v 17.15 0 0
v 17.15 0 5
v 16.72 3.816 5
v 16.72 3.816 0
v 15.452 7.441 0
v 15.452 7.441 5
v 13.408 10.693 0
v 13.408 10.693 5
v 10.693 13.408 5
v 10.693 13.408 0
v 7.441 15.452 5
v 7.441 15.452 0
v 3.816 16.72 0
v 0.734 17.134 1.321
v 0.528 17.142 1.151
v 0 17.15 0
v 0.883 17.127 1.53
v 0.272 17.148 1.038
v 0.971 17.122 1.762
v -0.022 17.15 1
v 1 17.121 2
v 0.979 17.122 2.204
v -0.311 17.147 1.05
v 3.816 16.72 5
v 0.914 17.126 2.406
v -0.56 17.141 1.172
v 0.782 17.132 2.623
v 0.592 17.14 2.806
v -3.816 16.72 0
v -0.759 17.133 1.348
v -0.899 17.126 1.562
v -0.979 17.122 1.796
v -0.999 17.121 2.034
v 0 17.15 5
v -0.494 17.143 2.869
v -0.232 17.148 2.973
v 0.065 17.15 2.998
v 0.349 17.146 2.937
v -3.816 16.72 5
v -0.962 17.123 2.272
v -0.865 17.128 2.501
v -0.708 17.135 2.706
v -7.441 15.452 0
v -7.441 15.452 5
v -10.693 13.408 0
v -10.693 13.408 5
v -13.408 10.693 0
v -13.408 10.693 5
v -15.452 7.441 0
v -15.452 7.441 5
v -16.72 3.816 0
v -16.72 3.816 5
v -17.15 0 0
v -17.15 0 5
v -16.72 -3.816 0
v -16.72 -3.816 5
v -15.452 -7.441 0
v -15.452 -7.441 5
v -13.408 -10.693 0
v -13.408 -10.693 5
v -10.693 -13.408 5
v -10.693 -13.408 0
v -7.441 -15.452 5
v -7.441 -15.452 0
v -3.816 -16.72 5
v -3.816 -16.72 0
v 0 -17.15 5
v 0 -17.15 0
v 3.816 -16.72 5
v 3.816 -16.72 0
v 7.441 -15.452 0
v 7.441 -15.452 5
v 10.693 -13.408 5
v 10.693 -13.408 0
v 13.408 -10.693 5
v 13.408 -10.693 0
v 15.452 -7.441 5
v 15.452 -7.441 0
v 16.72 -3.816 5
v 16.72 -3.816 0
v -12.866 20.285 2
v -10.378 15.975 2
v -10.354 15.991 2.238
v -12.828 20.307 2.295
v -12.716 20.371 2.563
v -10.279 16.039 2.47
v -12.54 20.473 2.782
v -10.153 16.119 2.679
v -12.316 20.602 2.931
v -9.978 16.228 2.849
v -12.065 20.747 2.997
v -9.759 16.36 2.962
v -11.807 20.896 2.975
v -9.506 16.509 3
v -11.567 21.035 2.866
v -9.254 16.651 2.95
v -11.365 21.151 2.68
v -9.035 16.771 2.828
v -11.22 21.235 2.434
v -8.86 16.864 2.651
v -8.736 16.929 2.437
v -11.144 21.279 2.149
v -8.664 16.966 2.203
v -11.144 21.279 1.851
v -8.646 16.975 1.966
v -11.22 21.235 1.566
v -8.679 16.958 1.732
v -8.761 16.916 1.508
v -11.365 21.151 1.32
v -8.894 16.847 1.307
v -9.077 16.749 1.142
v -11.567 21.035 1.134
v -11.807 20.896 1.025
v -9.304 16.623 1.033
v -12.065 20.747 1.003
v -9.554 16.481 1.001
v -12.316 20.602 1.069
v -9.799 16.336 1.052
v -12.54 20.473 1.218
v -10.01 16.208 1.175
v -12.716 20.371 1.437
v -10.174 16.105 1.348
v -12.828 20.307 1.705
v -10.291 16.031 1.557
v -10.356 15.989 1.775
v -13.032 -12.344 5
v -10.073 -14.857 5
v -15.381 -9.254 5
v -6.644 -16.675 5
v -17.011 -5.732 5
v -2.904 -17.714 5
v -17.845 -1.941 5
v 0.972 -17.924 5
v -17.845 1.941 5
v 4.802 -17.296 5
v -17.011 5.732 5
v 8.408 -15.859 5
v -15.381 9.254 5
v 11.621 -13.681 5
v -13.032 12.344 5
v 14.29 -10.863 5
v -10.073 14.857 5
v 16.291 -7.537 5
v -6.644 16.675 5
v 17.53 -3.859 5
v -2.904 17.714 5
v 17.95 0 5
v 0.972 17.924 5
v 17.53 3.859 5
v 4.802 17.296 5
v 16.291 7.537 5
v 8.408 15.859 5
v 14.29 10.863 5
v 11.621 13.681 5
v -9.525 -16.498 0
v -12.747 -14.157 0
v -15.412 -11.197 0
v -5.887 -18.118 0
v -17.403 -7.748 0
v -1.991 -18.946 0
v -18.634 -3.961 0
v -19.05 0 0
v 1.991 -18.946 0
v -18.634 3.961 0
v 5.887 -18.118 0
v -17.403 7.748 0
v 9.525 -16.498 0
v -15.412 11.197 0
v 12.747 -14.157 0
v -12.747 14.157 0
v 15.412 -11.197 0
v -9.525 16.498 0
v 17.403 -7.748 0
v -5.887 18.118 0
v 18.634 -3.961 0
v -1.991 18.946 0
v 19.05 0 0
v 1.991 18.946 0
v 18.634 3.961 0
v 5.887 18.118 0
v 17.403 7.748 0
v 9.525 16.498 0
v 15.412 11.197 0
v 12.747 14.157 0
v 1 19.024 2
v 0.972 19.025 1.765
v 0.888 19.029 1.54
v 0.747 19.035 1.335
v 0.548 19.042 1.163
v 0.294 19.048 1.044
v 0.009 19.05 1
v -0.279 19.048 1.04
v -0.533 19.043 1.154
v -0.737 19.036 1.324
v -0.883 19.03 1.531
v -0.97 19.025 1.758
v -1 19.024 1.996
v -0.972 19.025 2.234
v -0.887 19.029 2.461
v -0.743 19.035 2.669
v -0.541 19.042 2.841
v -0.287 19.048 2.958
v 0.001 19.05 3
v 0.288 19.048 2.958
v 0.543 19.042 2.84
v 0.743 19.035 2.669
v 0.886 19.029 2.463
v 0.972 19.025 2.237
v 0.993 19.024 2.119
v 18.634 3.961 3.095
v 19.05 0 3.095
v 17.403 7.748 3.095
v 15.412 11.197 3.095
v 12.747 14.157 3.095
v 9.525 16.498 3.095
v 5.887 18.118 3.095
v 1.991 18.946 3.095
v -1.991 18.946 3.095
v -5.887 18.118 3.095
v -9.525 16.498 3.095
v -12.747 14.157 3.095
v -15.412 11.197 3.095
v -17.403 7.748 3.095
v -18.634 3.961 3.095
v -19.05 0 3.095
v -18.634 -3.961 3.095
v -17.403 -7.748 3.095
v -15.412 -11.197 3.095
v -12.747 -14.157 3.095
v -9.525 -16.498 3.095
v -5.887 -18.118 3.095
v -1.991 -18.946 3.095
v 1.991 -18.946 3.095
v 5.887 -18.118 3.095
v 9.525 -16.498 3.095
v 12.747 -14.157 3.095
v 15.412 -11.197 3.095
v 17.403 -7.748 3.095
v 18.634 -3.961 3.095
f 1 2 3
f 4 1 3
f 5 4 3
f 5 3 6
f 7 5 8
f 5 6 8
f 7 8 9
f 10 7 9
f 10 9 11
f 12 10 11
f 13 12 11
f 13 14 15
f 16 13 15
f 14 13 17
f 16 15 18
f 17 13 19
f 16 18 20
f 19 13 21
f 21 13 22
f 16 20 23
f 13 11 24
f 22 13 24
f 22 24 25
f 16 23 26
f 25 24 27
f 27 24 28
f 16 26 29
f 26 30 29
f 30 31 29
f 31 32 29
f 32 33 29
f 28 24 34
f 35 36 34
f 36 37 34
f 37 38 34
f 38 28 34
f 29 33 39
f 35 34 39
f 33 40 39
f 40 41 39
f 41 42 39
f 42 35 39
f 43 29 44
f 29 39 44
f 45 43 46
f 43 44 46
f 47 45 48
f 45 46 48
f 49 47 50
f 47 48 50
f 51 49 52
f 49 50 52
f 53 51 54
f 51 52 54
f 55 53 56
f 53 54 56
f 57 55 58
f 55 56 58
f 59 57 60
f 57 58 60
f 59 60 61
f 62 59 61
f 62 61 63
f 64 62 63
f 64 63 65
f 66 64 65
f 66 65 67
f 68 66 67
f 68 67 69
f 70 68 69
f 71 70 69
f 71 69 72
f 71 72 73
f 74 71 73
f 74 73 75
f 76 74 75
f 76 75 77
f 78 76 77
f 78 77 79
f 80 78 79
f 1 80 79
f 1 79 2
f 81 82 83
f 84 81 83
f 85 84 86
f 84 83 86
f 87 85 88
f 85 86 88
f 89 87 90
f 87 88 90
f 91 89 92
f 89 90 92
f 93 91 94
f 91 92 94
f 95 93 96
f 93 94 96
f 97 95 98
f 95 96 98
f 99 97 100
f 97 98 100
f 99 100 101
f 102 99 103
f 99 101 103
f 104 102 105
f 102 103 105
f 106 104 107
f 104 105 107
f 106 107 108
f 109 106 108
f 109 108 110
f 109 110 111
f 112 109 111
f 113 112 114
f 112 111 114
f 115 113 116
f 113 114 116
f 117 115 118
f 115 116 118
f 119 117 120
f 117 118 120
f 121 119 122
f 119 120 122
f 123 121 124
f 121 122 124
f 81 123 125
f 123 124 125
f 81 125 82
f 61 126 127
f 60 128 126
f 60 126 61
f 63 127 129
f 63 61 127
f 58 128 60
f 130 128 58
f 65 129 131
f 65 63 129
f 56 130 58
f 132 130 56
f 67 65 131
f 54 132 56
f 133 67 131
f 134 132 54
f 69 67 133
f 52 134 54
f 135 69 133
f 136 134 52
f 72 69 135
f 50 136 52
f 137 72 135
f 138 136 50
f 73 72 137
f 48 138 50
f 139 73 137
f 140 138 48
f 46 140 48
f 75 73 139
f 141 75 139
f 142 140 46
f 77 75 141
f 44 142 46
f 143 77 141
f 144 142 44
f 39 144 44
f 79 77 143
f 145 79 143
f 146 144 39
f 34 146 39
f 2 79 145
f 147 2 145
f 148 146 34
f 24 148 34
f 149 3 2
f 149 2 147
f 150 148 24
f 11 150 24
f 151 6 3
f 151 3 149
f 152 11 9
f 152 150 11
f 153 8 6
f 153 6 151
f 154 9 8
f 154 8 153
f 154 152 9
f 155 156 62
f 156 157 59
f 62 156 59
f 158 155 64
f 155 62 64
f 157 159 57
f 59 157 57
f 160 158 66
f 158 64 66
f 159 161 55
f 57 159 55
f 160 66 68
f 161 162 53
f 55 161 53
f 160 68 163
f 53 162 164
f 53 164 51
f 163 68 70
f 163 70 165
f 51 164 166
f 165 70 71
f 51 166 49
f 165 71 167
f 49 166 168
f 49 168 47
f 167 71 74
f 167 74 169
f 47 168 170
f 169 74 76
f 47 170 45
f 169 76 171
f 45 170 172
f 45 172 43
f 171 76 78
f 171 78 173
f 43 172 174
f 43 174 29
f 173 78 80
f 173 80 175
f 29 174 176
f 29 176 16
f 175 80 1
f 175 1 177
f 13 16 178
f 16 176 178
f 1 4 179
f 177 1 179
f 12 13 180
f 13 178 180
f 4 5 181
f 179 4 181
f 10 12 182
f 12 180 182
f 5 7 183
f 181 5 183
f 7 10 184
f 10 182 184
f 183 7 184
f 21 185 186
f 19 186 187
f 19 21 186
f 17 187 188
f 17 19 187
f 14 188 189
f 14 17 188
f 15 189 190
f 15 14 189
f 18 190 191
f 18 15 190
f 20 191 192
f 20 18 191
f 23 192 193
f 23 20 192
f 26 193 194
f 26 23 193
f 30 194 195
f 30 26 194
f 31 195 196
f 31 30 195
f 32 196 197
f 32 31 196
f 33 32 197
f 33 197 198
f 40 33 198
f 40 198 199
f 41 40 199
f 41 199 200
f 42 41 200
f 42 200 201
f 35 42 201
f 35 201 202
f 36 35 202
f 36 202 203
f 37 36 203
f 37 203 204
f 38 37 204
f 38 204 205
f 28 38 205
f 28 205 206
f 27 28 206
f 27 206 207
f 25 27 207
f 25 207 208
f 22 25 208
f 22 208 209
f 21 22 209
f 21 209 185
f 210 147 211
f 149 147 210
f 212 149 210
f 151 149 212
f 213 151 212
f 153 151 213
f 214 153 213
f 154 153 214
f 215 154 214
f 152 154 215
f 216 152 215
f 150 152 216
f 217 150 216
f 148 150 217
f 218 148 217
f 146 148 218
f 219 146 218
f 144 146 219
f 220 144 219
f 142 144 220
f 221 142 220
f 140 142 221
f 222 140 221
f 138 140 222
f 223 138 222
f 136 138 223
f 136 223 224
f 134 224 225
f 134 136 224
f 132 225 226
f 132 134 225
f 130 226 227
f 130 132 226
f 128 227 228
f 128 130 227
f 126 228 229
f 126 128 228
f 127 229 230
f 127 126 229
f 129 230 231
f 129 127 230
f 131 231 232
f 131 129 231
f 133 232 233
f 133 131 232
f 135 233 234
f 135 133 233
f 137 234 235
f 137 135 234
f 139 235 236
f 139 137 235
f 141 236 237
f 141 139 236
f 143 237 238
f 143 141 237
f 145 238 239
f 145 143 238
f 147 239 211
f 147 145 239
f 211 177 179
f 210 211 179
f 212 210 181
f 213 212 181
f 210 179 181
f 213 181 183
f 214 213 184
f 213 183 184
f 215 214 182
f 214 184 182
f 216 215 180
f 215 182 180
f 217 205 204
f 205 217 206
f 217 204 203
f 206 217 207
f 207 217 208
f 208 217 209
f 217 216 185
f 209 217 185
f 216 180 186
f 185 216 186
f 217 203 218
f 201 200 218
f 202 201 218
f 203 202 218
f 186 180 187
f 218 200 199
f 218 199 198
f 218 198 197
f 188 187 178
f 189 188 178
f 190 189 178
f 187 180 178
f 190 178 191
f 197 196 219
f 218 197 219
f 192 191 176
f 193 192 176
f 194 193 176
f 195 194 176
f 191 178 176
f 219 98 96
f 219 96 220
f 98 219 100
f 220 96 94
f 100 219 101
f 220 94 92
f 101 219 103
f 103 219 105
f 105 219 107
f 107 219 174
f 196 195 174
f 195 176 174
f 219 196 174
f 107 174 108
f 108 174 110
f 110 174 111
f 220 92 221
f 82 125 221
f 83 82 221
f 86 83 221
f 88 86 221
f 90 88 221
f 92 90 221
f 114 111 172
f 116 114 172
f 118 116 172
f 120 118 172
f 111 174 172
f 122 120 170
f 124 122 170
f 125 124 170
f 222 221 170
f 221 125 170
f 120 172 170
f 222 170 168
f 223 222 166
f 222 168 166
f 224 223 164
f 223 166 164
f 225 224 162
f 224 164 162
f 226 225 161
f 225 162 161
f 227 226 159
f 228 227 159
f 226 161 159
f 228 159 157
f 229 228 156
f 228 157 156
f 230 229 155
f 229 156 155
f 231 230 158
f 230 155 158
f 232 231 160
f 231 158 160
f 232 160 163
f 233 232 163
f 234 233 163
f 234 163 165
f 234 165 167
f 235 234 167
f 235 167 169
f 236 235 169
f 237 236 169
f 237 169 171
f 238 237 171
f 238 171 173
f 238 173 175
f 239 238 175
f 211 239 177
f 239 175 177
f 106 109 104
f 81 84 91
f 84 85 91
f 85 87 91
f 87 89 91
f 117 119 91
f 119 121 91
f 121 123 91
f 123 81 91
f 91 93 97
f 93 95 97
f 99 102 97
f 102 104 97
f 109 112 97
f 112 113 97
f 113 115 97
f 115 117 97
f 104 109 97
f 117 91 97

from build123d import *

# Parameters (mm, degrees)
SKETCH1_R           = 19.05
BOSS_EXTRUDE1_DEPTH = 5
CHAMFER1_SIZE       = 1.905
CHAMFER1_SIZE2      = 1.099852263
SKETCH2_R           = 1
CUT_EXTRUDE1_DEPTH  = 30
SKETCH5_R           = 17.15
CUT_EXTRUDE2_DEPTH  = 15


with BuildPart() as part:
    # Sketch1 → Boss-Extrude1 (new body)
    with BuildSketch(Plane.XY):
        Circle(SKETCH1_R)
    extrude(amount=BOSS_EXTRUDE1_DEPTH)

    # Chamfer1
    chamfer1_edges = [part.edges().sort_by_distance(p)[0] for p in [
        (-19.05, 0, 5),
    ]]
    chamfer1_side = [part.faces().sort_by_distance(p)[0] for p in [
        (-19.05, 0, 2.5),
    ]]
    chamfer(chamfer1_edges, length=CHAMFER1_SIZE, length2=CHAMFER1_SIZE2, reference=chamfer1_side[0])

    # Sketch4 → Revolve-Thin1 (revolve)
    with BuildSketch(Plane.XY.offset(2)):
        Polygon((0, 0), (-12, 20.784609691), (-12.866025404, 20.284609691), (-0.866025404, -0.5), align=None)
    revolve(axis=Axis((0, 0, 2), (-0.5, 0.866025404, 0)))

    # Sketch2 → Cut-Extrude1 (cut)
    with BuildSketch(Plane(origin=(0, 0, 0), x_dir=(1, 0, 0), z_dir=(0, 1, 0))):
        with Locations((0, -2)):
            Circle(SKETCH2_R)
    extrude(amount=CUT_EXTRUDE1_DEPTH, mode=Mode.SUBTRACT)

    # Sketch5 → Cut-Extrude2 (cut)
    with BuildSketch(Plane.XY.offset(5)):
        Circle(SKETCH5_R)
    extrude(amount=-CUT_EXTRUDE2_DEPTH, mode=Mode.SUBTRACT)


solid = part.part
